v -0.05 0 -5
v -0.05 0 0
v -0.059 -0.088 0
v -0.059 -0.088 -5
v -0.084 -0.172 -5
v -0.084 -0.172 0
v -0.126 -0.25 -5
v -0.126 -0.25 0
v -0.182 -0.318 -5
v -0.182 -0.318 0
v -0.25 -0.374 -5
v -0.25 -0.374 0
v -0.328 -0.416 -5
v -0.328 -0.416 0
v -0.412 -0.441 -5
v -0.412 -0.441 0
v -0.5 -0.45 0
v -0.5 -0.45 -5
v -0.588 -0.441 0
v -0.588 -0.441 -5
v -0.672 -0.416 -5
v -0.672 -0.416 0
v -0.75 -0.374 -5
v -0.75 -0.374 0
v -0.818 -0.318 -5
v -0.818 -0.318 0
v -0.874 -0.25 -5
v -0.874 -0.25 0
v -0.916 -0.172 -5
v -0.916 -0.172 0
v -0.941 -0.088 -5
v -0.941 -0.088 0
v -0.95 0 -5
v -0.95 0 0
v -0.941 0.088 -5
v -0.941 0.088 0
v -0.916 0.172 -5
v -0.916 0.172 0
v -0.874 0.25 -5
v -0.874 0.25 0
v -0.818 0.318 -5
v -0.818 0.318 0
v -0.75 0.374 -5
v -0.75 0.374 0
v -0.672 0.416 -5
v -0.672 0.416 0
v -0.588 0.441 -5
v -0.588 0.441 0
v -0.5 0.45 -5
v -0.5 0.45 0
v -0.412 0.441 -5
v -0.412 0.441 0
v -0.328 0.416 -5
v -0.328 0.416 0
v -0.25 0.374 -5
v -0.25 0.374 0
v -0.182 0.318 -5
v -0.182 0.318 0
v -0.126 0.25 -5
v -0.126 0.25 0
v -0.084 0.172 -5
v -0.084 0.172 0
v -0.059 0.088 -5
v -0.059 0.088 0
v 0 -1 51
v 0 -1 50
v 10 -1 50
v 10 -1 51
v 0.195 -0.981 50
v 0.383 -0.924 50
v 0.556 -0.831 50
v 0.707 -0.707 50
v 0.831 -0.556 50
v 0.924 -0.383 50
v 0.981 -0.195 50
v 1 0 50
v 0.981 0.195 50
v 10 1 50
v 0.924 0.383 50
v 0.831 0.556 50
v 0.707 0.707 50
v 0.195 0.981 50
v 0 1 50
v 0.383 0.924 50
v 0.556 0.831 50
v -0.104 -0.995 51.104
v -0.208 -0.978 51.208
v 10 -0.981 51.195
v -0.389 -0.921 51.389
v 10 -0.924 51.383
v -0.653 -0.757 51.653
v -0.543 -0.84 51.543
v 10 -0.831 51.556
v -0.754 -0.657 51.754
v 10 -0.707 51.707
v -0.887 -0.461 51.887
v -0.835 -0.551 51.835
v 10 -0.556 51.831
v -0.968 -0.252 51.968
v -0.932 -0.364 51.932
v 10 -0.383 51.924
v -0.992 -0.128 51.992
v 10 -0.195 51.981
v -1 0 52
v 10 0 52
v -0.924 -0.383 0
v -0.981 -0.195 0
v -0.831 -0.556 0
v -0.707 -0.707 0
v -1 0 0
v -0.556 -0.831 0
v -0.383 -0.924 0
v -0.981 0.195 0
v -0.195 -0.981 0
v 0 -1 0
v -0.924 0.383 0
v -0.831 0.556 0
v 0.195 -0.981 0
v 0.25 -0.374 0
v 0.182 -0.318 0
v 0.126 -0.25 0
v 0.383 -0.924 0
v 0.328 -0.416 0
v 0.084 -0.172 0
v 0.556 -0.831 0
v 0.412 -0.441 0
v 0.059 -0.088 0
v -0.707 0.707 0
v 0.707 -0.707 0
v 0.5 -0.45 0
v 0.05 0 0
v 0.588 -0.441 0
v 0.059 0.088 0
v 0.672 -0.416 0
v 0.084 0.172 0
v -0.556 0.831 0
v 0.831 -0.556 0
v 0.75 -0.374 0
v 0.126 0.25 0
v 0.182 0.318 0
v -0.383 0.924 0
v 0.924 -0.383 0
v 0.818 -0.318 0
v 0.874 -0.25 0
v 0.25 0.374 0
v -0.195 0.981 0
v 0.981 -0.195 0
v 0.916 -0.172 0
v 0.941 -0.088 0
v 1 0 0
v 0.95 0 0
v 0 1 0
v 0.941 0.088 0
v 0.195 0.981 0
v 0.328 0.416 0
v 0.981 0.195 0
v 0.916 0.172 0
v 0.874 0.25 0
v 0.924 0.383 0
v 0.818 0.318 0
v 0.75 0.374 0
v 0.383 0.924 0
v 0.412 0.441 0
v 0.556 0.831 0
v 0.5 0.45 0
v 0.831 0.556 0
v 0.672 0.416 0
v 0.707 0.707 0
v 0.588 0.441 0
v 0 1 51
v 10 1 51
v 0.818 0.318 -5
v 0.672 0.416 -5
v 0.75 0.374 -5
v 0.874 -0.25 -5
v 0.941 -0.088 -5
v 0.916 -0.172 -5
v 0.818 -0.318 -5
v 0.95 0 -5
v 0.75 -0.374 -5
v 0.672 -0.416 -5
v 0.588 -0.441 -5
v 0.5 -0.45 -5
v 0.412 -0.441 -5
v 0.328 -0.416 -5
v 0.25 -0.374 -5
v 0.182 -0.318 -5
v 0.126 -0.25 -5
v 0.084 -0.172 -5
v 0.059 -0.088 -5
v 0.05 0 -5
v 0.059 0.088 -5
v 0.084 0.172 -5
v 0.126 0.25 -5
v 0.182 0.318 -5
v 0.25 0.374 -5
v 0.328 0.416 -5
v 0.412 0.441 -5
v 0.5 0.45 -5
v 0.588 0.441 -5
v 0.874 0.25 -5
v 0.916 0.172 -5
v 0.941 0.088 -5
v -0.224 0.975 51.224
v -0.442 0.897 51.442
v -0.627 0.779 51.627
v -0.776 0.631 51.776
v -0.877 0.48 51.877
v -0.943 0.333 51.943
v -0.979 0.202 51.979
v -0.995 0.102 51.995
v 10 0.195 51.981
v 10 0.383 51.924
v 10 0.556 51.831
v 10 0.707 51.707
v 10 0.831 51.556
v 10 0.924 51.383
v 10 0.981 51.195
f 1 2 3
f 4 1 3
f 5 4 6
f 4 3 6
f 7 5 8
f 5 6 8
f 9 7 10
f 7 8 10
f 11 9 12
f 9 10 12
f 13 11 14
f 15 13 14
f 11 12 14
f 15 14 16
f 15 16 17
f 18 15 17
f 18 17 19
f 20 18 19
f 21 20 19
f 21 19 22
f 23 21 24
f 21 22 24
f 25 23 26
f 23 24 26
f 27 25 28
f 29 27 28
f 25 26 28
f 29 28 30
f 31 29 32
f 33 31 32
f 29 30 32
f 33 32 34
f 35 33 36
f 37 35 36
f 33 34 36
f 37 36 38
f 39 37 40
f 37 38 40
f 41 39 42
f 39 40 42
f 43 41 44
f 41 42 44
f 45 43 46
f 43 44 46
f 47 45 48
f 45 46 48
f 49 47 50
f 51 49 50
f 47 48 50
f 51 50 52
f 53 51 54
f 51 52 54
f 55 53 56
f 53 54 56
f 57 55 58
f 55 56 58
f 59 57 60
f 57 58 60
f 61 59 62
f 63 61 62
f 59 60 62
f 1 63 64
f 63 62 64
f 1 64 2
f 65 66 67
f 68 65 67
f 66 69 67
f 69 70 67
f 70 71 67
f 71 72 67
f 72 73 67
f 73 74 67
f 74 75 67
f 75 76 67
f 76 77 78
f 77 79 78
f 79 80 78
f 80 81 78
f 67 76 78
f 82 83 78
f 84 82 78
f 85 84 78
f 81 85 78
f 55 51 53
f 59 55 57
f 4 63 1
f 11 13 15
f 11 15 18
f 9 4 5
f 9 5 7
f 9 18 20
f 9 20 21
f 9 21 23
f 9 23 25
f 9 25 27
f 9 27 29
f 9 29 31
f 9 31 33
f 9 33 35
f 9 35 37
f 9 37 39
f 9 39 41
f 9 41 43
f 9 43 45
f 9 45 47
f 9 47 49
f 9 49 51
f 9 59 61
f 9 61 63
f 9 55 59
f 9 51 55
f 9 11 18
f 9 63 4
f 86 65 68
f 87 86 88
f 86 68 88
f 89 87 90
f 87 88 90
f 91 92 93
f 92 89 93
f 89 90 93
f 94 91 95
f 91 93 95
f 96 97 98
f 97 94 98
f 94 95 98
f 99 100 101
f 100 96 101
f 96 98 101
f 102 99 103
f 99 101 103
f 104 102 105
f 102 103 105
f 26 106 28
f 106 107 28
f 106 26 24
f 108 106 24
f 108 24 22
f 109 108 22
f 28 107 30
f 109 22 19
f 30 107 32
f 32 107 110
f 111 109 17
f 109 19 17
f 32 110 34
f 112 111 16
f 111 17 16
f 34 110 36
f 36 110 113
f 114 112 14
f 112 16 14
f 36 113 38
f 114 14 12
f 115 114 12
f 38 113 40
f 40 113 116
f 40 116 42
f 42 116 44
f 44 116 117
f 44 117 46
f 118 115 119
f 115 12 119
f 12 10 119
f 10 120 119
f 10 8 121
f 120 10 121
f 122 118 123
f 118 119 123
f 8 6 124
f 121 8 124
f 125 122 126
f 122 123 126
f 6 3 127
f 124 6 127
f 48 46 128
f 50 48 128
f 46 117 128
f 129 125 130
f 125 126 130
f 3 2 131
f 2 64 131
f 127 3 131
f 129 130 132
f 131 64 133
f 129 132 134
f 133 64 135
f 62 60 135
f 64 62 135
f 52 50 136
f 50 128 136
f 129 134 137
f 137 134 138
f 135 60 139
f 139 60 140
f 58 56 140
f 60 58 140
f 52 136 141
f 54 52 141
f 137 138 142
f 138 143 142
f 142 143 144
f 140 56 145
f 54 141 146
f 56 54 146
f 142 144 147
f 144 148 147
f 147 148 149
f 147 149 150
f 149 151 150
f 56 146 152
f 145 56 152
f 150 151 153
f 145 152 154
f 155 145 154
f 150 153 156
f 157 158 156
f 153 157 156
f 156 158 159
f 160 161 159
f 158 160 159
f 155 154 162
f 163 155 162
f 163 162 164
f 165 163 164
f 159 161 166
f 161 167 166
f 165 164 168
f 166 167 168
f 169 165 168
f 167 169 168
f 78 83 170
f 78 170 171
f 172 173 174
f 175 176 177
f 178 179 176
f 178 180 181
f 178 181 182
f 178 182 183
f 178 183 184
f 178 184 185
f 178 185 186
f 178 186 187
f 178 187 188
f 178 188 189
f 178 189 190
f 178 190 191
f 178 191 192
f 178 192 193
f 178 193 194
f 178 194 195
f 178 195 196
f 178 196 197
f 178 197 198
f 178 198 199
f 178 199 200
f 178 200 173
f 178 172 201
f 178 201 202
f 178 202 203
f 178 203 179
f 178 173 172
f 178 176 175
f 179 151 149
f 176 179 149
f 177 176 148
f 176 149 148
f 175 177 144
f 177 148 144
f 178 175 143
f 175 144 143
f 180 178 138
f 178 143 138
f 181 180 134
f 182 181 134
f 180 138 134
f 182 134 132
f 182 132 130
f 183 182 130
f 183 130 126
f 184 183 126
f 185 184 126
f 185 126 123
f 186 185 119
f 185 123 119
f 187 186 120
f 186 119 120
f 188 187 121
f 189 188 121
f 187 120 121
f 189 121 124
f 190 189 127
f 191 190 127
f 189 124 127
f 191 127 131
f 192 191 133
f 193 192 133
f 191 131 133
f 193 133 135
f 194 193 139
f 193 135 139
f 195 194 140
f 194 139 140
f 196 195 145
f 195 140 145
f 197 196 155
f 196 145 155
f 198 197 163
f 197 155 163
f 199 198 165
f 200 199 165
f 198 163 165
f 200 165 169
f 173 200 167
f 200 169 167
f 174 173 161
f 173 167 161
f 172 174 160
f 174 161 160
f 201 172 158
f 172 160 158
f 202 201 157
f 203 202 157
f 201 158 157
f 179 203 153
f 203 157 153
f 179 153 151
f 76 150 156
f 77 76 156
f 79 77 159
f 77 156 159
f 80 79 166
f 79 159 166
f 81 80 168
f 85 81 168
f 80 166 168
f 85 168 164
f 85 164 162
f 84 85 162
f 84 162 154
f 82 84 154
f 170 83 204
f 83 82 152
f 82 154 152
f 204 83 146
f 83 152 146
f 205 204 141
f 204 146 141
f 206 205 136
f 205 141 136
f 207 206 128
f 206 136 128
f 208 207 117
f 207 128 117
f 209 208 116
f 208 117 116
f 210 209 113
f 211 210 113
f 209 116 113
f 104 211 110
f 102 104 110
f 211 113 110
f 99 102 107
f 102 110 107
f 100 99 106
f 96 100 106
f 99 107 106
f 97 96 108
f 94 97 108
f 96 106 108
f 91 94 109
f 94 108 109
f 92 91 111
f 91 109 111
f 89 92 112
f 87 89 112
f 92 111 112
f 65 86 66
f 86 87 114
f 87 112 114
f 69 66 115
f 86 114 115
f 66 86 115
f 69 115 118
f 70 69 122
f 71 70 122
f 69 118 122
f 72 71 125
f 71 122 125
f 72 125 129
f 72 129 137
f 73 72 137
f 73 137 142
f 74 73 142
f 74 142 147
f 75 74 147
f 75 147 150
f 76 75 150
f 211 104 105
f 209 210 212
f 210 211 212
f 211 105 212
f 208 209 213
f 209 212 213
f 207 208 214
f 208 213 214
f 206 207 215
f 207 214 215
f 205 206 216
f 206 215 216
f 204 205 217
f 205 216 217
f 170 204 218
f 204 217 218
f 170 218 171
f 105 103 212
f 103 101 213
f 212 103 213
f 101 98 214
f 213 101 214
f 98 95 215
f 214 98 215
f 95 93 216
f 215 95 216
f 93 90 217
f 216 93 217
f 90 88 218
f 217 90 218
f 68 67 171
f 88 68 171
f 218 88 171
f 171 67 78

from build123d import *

# Parameters (mm, degrees)
SKETCH1_R           = 1
BOSS_EXTRUDE1_DEPTH = 50
SKETCH2_W           = 10
SKETCH2_H           = 2
BOSS_EXTRUDE2_DEPTH = 2
BOSS_EXTRUDE3_DEPTH = 2
CUT_EXTRUDE1_REACH  = 55.16
SKETCH5_R           = 0.45
BOSS_EXTRUDE4_DEPTH = 5


with BuildPart() as part:
    # Sketch1 → Boss-Extrude1 (new body)
    with BuildSketch(Plane.XY):
        Circle(SKETCH1_R)
    extrude(amount=BOSS_EXTRUDE1_DEPTH)

    # Sketch2 → Boss-Extrude2 (add)
    with BuildSketch(Plane.XY.offset(50)):
        with Locations((5, 0)):
            Rectangle(SKETCH2_W, SKETCH2_H)
    extrude(amount=BOSS_EXTRUDE2_DEPTH)

    # Sketch3 → Boss-Extrude3 (add)
    with BuildSketch(Plane.XY.offset(50)):
        with BuildLine():
            Line((0, -1), (0, 1))
            ThreePointArc((0, 1), (-1, 0), (0, -1))
        make_face()
    extrude(amount=BOSS_EXTRUDE3_DEPTH)

    # Sketch4 → Cut-Extrude1 (cut, up to next)
    with BuildSketch(Plane(origin=(10, 0, 0), x_dir=(0, 0, -1), z_dir=(1, 0, 0)), mode=Mode.PRIVATE) as cut_extrude1_sk1:
        with BuildLine():
            ThreePointArc((-52, 0), (-51.707106781, 0.707106781), (-51, 1))
            Line((-51, 1), (-52, 1))
            Line((-52, 1), (-52, 0))
        make_face()
    cut_extrude1_tool1 = extrude(cut_extrude1_sk1.sketch, amount=-CUT_EXTRUDE1_REACH, mode=Mode.PRIVATE) & part.part
    # Sketch4 → Cut-Extrude1 (cut, up to next)
    with BuildSketch(Plane(origin=(10, 0, 0), x_dir=(0, 0, -1), z_dir=(1, 0, 0)), mode=Mode.PRIVATE) as cut_extrude1_sk2:
        with BuildLine():
            Line((-52, -1), (-51, -1))
            ThreePointArc((-51, -1), (-51.707106781, -0.707106781), (-52, 0))
            Line((-52, 0), (-52, -1))
        make_face()
    cut_extrude1_tool2 = extrude(cut_extrude1_sk2.sketch, amount=-CUT_EXTRUDE1_REACH, mode=Mode.PRIVATE) & part.part
    add(cut_extrude1_tool1.solids().sort_by_distance((10, 0.776632, 51.776632))[0], mode=Mode.SUBTRACT)
    add(cut_extrude1_tool2.solids().sort_by_distance((10, -0.776632, 51.776632))[0], mode=Mode.SUBTRACT)

    # Sketch5 → Boss-Extrude4 (add)
    with BuildSketch(Plane(origin=(0, 0, 0), x_dir=(-1, 0, 0), z_dir=(0, 0, -1))):
        with Locations(Location((0.5, 0, 0), (0, 0, 180))):
            Circle(SKETCH5_R)
        with Locations(Location((-0.5, 0, 0), (0, 0, 180))):
            Circle(SKETCH5_R)
    extrude(amount=BOSS_EXTRUDE4_DEPTH)


solid = part.part
